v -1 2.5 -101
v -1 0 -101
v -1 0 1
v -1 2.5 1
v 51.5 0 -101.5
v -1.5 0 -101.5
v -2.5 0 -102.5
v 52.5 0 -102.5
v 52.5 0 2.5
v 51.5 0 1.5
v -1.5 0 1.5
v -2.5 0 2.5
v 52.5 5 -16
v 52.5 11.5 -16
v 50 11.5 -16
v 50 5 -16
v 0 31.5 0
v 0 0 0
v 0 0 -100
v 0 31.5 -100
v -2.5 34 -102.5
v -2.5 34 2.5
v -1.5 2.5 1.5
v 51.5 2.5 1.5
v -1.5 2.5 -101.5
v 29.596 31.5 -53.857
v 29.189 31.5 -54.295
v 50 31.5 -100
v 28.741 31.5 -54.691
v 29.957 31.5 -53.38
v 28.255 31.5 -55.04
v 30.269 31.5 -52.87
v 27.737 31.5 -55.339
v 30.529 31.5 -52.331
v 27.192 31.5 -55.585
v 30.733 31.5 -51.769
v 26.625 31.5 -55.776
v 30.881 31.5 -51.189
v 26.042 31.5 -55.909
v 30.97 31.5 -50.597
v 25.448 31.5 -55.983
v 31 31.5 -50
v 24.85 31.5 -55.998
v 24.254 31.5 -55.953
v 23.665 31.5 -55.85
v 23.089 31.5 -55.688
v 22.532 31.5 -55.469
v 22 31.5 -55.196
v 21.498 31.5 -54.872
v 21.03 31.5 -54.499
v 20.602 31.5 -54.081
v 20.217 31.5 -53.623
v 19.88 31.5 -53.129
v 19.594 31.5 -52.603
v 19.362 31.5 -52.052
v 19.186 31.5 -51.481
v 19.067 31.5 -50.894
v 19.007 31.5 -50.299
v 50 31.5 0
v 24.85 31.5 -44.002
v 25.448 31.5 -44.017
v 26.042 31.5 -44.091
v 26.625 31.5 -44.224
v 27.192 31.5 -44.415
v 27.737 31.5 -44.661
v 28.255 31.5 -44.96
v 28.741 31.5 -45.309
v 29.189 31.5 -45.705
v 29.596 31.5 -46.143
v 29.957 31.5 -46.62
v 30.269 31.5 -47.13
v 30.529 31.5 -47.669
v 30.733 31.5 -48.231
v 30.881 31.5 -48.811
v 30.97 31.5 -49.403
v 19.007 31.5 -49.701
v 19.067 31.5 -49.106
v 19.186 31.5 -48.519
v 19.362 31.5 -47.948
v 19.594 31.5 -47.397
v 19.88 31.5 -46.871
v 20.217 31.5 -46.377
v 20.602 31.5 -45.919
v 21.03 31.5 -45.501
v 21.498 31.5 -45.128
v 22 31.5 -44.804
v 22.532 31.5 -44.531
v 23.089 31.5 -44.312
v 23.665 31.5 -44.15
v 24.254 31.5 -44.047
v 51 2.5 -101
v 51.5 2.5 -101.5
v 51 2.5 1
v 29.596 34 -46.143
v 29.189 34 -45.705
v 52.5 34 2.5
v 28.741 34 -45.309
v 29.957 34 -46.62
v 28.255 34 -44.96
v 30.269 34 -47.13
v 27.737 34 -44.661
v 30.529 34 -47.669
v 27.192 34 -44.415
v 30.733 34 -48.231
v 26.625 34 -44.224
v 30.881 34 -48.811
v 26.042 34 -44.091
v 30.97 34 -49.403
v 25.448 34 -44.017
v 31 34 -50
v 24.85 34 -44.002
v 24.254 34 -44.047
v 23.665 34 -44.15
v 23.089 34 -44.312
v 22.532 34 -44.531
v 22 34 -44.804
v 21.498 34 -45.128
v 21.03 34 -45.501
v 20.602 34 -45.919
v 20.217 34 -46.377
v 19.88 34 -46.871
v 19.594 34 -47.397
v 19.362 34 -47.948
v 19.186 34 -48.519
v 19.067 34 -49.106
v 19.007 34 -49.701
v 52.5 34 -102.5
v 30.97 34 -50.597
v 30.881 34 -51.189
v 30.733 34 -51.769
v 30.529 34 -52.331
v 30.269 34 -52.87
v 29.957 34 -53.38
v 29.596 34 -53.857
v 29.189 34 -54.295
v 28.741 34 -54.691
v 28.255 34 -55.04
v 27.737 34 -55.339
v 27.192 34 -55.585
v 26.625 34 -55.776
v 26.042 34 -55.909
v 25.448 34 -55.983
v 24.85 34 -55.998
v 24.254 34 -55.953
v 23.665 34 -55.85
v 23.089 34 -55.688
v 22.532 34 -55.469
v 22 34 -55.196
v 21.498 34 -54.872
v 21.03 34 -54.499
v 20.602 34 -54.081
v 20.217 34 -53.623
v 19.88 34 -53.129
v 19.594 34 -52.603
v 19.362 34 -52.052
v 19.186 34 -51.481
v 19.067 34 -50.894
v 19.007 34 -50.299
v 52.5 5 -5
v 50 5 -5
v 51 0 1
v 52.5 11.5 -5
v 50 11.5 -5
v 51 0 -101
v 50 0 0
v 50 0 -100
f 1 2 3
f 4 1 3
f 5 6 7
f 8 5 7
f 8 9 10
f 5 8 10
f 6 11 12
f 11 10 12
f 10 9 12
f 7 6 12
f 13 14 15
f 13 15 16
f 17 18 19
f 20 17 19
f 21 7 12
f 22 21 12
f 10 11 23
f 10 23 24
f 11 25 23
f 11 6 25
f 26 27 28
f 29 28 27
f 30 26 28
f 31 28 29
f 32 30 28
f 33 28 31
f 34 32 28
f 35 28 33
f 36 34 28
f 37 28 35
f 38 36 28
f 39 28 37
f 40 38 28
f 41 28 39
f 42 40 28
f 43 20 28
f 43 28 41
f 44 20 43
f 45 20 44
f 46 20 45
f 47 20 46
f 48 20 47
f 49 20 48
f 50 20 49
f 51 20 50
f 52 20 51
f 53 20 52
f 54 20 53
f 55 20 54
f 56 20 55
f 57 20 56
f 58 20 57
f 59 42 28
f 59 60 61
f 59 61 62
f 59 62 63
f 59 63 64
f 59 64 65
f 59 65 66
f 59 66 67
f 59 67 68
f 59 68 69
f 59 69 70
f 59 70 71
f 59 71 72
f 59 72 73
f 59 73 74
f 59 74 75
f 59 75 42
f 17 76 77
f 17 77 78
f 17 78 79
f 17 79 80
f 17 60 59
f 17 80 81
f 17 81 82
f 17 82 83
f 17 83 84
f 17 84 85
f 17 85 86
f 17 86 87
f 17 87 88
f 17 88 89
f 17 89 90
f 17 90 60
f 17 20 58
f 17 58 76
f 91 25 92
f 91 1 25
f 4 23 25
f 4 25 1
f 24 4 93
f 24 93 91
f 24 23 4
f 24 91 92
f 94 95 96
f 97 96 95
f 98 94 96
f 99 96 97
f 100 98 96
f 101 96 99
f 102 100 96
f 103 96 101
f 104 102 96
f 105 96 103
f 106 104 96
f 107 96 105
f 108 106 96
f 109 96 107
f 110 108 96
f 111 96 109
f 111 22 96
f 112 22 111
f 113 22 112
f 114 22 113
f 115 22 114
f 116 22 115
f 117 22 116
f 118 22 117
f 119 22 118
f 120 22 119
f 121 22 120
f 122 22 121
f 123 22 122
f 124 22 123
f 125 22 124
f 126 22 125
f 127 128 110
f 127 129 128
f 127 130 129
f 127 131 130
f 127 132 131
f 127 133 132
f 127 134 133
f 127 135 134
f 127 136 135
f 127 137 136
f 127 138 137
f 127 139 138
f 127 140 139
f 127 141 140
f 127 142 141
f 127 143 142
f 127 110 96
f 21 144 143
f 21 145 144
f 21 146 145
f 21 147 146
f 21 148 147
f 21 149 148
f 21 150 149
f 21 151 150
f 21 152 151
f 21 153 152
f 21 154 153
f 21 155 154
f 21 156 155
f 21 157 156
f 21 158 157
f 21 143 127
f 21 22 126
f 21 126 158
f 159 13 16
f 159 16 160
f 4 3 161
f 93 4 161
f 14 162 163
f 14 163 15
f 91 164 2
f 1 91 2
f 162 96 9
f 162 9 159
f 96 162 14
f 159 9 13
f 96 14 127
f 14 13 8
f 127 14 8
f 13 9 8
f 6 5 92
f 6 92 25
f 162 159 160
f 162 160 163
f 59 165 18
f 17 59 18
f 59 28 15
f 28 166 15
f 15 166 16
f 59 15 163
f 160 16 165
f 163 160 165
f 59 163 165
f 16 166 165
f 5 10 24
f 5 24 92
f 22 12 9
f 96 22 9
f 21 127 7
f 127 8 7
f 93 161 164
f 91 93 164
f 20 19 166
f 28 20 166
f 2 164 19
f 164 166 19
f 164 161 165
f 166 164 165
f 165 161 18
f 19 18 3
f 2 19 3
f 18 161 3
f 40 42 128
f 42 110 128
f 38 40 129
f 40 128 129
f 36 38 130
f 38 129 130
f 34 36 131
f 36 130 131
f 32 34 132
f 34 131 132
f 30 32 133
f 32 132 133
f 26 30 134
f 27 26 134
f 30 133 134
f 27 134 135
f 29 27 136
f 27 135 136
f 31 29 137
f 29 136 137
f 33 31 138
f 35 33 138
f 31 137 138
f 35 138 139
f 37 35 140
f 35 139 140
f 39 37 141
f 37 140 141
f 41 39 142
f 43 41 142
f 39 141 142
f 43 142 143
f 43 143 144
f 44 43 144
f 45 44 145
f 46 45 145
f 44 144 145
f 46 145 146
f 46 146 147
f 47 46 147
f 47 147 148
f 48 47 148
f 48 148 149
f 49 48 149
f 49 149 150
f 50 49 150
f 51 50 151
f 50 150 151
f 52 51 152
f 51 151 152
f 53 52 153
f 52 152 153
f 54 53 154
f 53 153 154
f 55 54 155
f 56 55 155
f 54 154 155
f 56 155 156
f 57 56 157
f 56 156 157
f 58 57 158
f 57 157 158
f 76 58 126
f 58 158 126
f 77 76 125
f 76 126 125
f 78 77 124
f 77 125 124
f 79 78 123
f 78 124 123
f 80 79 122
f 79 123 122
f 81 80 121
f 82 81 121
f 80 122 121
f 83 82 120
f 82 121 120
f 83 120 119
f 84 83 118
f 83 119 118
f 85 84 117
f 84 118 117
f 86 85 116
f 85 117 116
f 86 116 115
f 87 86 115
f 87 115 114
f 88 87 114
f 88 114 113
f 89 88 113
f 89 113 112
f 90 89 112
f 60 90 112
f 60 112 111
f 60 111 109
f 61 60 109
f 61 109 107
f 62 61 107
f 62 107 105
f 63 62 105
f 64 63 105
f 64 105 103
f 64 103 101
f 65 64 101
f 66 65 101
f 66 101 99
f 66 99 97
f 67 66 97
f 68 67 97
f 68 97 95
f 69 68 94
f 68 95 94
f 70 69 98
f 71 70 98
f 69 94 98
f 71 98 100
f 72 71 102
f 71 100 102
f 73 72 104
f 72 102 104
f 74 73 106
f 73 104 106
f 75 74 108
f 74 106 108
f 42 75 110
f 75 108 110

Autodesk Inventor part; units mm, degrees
ref_plane "우측면도" through (0, 0, 0) normal (1, 0, 0) x (0, 1, 0)
ref_plane "평면도" through (0, 0, 0) normal (0, 1, 0) x (-1, 0, 0)
ref_plane "정면도" through (0, 0, 0) normal (0, 0, 1) x (1, 0, 0)
sketch "스케치1" plane through (0, 0, 0) normal (0, 1, 0) x (-1, 0, 0)
  line L0 (0, 0) -> (0, -100)
  line L1 (0, -100) -> (-50, -100)
  line L2 (-50, -100) -> (-50, 0)
  line L3 (-50, 0) -> (0, 0)
  line L4 (2.5, -102.5) -> (2.5, 2.5)
  line L5 (2.5, 2.5) -> (-52.5, 2.5)
  line L6 (-52.5, 2.5) -> (-52.5, -102.5)
  line L7 (-52.5, -102.5) -> (2.5, -102.5)
  line L8 (1, -101) -> (1, 1)
  line L9 (1, 1) -> (-51, 1)
  line L10 (-51, 1) -> (-51, -101)
  line L11 (-51, -101) -> (1, -101)
  line L12 (1.5, -101.5) -> (1.5, 1.5)
  line L13 (1.5, 1.5) -> (-51.5, 1.5)
  line L14 (-51.5, 1.5) -> (-51.5, -101.5)
  line L15 (-51.5, -101.5) -> (1.5, -101.5)
  dimension "d1" = 50
  dimension "d2" = 100
  dimension "d5" = 2.5
  dimension "d6" = 1.5
  dimension "d7" = 0.5
extrude "돌출1" add sketch "스케치1" along normal blind 34 contours L7 L6 L5 L4 | L11 L10 L9 L8 | L15 L14 L13 L12
sketch "스케치4" plane through (50, 0, 0) normal (-1, 0, 0) x (0, 0, 1)
  line L0 (-100, 34) -> (0, 34) projected
  line L1 (-100, 34) -> (0, 34)
  line L2 (0, 34) -> (0, 31.5)
  line L3 (0, 31.5) -> (-100, 31.5)
  line L4 (-100, 34) -> (-100, 31.5)
  line L5 (0, 34) -> (0, 31.5)
  point P0 (0, 0)
  dimension "d12" = 2.5
sketch "스케치5" plane through (0, 0, -100) normal (1, 0, 0) x (0, 0, -1)
  line L0 (-100, 34) -> (0, 34) projected
  line L1 (0, 34) -> (0, 31.5)
  line L2 (0, 31.5) -> (-100, 31.5)
  line L3 (-100, 34) -> (-100, 31.5)
  line L4 (-100, 34) -> (0, 34)
  point P0 (-100, 0)
  dimension "d13" = 2.5
loft "로프트1" add profiles "스케치4", "스케치5"
sketch "스케치6" plane through (0, 34, 0) normal (0, 1, 0) x (1, 0, 0)
  line L0 (-2.5, 102.5) -> (-2.5, -2.5) projected
  line L1 (-2.5, -2.5) -> (52.5, -2.5) projected
  line L2 (52.5, -2.5) -> (52.5, 102.5) projected
  line L3 (52.5, 102.5) -> (-2.5, 102.5) projected
  circle A0 centre (25, 50) radius 6
  point P0 (0, 0)
  dimension "d18" = 12
  dimension "d31" = 27.5
  dimension "d32" = 52.5
extrude "돌출2" cut sketch "스케치6" against normal blind 50 contours A0
sketch "스케치8" plane through (0, 0, 0) normal (0, -1, 0) x (1, 0, 0)
  line L0 (50, -100) -> (0, -100) projected
  line L1 (0, -100) -> (0, 0) projected
  line L2 (0, 0) -> (50, 0) projected
  line L3 (50, 0) -> (50, -100) projected
  line L4 (-2.5, -102.5) -> (-2.5, 2.5) projected
  line L5 (52.5, -102.5) -> (-2.5, -102.5) projected
  line L6 (52.5, 2.5) -> (52.5, -102.5) projected
  line L7 (-2.5, 2.5) -> (52.5, 2.5) projected
  line L8 (-1.5, -101.5) -> (-1.5, 1.5) projected
  line L9 (-1, -101) -> (-1, 1) projected
  line L10 (-1.5, 1.5) -> (51.5, 1.5) projected
  line L11 (-1, 1) -> (51, 1) projected
  line L12 (51, 1) -> (51, -101) projected
  line L13 (51.5, 1.5) -> (51.5, -101.5) projected
  line L14 (51, -101) -> (-1, -101) projected
  line L15 (51.5, -101.5) -> (-1.5, -101.5) projected
extrude "돌출4" cut sketch "스케치8" against normal blind 2.5 contours L8 L10 L13 L15
sketch "스케치9" plane through (52.5, 0, 2.5) normal (1, 0, 0) x (0, 0, -1)
  line L0 (0, 0) -> (105, 0) projected
  line L1 (105, 0) -> (105, 34) projected
  line L2 (0, 34) -> (105, 34) projected
  line L3 (0, 0) -> (0, 34) projected
  line L4 (7.5, 11.5) -> (18.5, 11.5)
  line L5 (18.5, 11.5) -> (18.5, 5)
  line L6 (18.5, 5) -> (7.5, 5)
  line L7 (7.5, 5) -> (7.5, 11.5)
  point P0 (2.5, 0)
  dimension "d25" = 6.5
  dimension "d26" = 11
  dimension "d27" = 5
  dimension "d28" = 5
extrude "돌출5" cut sketch "스케치9" against normal blind 10 contours L4 L5 L6 L7
properties part number "호출벨 new"
